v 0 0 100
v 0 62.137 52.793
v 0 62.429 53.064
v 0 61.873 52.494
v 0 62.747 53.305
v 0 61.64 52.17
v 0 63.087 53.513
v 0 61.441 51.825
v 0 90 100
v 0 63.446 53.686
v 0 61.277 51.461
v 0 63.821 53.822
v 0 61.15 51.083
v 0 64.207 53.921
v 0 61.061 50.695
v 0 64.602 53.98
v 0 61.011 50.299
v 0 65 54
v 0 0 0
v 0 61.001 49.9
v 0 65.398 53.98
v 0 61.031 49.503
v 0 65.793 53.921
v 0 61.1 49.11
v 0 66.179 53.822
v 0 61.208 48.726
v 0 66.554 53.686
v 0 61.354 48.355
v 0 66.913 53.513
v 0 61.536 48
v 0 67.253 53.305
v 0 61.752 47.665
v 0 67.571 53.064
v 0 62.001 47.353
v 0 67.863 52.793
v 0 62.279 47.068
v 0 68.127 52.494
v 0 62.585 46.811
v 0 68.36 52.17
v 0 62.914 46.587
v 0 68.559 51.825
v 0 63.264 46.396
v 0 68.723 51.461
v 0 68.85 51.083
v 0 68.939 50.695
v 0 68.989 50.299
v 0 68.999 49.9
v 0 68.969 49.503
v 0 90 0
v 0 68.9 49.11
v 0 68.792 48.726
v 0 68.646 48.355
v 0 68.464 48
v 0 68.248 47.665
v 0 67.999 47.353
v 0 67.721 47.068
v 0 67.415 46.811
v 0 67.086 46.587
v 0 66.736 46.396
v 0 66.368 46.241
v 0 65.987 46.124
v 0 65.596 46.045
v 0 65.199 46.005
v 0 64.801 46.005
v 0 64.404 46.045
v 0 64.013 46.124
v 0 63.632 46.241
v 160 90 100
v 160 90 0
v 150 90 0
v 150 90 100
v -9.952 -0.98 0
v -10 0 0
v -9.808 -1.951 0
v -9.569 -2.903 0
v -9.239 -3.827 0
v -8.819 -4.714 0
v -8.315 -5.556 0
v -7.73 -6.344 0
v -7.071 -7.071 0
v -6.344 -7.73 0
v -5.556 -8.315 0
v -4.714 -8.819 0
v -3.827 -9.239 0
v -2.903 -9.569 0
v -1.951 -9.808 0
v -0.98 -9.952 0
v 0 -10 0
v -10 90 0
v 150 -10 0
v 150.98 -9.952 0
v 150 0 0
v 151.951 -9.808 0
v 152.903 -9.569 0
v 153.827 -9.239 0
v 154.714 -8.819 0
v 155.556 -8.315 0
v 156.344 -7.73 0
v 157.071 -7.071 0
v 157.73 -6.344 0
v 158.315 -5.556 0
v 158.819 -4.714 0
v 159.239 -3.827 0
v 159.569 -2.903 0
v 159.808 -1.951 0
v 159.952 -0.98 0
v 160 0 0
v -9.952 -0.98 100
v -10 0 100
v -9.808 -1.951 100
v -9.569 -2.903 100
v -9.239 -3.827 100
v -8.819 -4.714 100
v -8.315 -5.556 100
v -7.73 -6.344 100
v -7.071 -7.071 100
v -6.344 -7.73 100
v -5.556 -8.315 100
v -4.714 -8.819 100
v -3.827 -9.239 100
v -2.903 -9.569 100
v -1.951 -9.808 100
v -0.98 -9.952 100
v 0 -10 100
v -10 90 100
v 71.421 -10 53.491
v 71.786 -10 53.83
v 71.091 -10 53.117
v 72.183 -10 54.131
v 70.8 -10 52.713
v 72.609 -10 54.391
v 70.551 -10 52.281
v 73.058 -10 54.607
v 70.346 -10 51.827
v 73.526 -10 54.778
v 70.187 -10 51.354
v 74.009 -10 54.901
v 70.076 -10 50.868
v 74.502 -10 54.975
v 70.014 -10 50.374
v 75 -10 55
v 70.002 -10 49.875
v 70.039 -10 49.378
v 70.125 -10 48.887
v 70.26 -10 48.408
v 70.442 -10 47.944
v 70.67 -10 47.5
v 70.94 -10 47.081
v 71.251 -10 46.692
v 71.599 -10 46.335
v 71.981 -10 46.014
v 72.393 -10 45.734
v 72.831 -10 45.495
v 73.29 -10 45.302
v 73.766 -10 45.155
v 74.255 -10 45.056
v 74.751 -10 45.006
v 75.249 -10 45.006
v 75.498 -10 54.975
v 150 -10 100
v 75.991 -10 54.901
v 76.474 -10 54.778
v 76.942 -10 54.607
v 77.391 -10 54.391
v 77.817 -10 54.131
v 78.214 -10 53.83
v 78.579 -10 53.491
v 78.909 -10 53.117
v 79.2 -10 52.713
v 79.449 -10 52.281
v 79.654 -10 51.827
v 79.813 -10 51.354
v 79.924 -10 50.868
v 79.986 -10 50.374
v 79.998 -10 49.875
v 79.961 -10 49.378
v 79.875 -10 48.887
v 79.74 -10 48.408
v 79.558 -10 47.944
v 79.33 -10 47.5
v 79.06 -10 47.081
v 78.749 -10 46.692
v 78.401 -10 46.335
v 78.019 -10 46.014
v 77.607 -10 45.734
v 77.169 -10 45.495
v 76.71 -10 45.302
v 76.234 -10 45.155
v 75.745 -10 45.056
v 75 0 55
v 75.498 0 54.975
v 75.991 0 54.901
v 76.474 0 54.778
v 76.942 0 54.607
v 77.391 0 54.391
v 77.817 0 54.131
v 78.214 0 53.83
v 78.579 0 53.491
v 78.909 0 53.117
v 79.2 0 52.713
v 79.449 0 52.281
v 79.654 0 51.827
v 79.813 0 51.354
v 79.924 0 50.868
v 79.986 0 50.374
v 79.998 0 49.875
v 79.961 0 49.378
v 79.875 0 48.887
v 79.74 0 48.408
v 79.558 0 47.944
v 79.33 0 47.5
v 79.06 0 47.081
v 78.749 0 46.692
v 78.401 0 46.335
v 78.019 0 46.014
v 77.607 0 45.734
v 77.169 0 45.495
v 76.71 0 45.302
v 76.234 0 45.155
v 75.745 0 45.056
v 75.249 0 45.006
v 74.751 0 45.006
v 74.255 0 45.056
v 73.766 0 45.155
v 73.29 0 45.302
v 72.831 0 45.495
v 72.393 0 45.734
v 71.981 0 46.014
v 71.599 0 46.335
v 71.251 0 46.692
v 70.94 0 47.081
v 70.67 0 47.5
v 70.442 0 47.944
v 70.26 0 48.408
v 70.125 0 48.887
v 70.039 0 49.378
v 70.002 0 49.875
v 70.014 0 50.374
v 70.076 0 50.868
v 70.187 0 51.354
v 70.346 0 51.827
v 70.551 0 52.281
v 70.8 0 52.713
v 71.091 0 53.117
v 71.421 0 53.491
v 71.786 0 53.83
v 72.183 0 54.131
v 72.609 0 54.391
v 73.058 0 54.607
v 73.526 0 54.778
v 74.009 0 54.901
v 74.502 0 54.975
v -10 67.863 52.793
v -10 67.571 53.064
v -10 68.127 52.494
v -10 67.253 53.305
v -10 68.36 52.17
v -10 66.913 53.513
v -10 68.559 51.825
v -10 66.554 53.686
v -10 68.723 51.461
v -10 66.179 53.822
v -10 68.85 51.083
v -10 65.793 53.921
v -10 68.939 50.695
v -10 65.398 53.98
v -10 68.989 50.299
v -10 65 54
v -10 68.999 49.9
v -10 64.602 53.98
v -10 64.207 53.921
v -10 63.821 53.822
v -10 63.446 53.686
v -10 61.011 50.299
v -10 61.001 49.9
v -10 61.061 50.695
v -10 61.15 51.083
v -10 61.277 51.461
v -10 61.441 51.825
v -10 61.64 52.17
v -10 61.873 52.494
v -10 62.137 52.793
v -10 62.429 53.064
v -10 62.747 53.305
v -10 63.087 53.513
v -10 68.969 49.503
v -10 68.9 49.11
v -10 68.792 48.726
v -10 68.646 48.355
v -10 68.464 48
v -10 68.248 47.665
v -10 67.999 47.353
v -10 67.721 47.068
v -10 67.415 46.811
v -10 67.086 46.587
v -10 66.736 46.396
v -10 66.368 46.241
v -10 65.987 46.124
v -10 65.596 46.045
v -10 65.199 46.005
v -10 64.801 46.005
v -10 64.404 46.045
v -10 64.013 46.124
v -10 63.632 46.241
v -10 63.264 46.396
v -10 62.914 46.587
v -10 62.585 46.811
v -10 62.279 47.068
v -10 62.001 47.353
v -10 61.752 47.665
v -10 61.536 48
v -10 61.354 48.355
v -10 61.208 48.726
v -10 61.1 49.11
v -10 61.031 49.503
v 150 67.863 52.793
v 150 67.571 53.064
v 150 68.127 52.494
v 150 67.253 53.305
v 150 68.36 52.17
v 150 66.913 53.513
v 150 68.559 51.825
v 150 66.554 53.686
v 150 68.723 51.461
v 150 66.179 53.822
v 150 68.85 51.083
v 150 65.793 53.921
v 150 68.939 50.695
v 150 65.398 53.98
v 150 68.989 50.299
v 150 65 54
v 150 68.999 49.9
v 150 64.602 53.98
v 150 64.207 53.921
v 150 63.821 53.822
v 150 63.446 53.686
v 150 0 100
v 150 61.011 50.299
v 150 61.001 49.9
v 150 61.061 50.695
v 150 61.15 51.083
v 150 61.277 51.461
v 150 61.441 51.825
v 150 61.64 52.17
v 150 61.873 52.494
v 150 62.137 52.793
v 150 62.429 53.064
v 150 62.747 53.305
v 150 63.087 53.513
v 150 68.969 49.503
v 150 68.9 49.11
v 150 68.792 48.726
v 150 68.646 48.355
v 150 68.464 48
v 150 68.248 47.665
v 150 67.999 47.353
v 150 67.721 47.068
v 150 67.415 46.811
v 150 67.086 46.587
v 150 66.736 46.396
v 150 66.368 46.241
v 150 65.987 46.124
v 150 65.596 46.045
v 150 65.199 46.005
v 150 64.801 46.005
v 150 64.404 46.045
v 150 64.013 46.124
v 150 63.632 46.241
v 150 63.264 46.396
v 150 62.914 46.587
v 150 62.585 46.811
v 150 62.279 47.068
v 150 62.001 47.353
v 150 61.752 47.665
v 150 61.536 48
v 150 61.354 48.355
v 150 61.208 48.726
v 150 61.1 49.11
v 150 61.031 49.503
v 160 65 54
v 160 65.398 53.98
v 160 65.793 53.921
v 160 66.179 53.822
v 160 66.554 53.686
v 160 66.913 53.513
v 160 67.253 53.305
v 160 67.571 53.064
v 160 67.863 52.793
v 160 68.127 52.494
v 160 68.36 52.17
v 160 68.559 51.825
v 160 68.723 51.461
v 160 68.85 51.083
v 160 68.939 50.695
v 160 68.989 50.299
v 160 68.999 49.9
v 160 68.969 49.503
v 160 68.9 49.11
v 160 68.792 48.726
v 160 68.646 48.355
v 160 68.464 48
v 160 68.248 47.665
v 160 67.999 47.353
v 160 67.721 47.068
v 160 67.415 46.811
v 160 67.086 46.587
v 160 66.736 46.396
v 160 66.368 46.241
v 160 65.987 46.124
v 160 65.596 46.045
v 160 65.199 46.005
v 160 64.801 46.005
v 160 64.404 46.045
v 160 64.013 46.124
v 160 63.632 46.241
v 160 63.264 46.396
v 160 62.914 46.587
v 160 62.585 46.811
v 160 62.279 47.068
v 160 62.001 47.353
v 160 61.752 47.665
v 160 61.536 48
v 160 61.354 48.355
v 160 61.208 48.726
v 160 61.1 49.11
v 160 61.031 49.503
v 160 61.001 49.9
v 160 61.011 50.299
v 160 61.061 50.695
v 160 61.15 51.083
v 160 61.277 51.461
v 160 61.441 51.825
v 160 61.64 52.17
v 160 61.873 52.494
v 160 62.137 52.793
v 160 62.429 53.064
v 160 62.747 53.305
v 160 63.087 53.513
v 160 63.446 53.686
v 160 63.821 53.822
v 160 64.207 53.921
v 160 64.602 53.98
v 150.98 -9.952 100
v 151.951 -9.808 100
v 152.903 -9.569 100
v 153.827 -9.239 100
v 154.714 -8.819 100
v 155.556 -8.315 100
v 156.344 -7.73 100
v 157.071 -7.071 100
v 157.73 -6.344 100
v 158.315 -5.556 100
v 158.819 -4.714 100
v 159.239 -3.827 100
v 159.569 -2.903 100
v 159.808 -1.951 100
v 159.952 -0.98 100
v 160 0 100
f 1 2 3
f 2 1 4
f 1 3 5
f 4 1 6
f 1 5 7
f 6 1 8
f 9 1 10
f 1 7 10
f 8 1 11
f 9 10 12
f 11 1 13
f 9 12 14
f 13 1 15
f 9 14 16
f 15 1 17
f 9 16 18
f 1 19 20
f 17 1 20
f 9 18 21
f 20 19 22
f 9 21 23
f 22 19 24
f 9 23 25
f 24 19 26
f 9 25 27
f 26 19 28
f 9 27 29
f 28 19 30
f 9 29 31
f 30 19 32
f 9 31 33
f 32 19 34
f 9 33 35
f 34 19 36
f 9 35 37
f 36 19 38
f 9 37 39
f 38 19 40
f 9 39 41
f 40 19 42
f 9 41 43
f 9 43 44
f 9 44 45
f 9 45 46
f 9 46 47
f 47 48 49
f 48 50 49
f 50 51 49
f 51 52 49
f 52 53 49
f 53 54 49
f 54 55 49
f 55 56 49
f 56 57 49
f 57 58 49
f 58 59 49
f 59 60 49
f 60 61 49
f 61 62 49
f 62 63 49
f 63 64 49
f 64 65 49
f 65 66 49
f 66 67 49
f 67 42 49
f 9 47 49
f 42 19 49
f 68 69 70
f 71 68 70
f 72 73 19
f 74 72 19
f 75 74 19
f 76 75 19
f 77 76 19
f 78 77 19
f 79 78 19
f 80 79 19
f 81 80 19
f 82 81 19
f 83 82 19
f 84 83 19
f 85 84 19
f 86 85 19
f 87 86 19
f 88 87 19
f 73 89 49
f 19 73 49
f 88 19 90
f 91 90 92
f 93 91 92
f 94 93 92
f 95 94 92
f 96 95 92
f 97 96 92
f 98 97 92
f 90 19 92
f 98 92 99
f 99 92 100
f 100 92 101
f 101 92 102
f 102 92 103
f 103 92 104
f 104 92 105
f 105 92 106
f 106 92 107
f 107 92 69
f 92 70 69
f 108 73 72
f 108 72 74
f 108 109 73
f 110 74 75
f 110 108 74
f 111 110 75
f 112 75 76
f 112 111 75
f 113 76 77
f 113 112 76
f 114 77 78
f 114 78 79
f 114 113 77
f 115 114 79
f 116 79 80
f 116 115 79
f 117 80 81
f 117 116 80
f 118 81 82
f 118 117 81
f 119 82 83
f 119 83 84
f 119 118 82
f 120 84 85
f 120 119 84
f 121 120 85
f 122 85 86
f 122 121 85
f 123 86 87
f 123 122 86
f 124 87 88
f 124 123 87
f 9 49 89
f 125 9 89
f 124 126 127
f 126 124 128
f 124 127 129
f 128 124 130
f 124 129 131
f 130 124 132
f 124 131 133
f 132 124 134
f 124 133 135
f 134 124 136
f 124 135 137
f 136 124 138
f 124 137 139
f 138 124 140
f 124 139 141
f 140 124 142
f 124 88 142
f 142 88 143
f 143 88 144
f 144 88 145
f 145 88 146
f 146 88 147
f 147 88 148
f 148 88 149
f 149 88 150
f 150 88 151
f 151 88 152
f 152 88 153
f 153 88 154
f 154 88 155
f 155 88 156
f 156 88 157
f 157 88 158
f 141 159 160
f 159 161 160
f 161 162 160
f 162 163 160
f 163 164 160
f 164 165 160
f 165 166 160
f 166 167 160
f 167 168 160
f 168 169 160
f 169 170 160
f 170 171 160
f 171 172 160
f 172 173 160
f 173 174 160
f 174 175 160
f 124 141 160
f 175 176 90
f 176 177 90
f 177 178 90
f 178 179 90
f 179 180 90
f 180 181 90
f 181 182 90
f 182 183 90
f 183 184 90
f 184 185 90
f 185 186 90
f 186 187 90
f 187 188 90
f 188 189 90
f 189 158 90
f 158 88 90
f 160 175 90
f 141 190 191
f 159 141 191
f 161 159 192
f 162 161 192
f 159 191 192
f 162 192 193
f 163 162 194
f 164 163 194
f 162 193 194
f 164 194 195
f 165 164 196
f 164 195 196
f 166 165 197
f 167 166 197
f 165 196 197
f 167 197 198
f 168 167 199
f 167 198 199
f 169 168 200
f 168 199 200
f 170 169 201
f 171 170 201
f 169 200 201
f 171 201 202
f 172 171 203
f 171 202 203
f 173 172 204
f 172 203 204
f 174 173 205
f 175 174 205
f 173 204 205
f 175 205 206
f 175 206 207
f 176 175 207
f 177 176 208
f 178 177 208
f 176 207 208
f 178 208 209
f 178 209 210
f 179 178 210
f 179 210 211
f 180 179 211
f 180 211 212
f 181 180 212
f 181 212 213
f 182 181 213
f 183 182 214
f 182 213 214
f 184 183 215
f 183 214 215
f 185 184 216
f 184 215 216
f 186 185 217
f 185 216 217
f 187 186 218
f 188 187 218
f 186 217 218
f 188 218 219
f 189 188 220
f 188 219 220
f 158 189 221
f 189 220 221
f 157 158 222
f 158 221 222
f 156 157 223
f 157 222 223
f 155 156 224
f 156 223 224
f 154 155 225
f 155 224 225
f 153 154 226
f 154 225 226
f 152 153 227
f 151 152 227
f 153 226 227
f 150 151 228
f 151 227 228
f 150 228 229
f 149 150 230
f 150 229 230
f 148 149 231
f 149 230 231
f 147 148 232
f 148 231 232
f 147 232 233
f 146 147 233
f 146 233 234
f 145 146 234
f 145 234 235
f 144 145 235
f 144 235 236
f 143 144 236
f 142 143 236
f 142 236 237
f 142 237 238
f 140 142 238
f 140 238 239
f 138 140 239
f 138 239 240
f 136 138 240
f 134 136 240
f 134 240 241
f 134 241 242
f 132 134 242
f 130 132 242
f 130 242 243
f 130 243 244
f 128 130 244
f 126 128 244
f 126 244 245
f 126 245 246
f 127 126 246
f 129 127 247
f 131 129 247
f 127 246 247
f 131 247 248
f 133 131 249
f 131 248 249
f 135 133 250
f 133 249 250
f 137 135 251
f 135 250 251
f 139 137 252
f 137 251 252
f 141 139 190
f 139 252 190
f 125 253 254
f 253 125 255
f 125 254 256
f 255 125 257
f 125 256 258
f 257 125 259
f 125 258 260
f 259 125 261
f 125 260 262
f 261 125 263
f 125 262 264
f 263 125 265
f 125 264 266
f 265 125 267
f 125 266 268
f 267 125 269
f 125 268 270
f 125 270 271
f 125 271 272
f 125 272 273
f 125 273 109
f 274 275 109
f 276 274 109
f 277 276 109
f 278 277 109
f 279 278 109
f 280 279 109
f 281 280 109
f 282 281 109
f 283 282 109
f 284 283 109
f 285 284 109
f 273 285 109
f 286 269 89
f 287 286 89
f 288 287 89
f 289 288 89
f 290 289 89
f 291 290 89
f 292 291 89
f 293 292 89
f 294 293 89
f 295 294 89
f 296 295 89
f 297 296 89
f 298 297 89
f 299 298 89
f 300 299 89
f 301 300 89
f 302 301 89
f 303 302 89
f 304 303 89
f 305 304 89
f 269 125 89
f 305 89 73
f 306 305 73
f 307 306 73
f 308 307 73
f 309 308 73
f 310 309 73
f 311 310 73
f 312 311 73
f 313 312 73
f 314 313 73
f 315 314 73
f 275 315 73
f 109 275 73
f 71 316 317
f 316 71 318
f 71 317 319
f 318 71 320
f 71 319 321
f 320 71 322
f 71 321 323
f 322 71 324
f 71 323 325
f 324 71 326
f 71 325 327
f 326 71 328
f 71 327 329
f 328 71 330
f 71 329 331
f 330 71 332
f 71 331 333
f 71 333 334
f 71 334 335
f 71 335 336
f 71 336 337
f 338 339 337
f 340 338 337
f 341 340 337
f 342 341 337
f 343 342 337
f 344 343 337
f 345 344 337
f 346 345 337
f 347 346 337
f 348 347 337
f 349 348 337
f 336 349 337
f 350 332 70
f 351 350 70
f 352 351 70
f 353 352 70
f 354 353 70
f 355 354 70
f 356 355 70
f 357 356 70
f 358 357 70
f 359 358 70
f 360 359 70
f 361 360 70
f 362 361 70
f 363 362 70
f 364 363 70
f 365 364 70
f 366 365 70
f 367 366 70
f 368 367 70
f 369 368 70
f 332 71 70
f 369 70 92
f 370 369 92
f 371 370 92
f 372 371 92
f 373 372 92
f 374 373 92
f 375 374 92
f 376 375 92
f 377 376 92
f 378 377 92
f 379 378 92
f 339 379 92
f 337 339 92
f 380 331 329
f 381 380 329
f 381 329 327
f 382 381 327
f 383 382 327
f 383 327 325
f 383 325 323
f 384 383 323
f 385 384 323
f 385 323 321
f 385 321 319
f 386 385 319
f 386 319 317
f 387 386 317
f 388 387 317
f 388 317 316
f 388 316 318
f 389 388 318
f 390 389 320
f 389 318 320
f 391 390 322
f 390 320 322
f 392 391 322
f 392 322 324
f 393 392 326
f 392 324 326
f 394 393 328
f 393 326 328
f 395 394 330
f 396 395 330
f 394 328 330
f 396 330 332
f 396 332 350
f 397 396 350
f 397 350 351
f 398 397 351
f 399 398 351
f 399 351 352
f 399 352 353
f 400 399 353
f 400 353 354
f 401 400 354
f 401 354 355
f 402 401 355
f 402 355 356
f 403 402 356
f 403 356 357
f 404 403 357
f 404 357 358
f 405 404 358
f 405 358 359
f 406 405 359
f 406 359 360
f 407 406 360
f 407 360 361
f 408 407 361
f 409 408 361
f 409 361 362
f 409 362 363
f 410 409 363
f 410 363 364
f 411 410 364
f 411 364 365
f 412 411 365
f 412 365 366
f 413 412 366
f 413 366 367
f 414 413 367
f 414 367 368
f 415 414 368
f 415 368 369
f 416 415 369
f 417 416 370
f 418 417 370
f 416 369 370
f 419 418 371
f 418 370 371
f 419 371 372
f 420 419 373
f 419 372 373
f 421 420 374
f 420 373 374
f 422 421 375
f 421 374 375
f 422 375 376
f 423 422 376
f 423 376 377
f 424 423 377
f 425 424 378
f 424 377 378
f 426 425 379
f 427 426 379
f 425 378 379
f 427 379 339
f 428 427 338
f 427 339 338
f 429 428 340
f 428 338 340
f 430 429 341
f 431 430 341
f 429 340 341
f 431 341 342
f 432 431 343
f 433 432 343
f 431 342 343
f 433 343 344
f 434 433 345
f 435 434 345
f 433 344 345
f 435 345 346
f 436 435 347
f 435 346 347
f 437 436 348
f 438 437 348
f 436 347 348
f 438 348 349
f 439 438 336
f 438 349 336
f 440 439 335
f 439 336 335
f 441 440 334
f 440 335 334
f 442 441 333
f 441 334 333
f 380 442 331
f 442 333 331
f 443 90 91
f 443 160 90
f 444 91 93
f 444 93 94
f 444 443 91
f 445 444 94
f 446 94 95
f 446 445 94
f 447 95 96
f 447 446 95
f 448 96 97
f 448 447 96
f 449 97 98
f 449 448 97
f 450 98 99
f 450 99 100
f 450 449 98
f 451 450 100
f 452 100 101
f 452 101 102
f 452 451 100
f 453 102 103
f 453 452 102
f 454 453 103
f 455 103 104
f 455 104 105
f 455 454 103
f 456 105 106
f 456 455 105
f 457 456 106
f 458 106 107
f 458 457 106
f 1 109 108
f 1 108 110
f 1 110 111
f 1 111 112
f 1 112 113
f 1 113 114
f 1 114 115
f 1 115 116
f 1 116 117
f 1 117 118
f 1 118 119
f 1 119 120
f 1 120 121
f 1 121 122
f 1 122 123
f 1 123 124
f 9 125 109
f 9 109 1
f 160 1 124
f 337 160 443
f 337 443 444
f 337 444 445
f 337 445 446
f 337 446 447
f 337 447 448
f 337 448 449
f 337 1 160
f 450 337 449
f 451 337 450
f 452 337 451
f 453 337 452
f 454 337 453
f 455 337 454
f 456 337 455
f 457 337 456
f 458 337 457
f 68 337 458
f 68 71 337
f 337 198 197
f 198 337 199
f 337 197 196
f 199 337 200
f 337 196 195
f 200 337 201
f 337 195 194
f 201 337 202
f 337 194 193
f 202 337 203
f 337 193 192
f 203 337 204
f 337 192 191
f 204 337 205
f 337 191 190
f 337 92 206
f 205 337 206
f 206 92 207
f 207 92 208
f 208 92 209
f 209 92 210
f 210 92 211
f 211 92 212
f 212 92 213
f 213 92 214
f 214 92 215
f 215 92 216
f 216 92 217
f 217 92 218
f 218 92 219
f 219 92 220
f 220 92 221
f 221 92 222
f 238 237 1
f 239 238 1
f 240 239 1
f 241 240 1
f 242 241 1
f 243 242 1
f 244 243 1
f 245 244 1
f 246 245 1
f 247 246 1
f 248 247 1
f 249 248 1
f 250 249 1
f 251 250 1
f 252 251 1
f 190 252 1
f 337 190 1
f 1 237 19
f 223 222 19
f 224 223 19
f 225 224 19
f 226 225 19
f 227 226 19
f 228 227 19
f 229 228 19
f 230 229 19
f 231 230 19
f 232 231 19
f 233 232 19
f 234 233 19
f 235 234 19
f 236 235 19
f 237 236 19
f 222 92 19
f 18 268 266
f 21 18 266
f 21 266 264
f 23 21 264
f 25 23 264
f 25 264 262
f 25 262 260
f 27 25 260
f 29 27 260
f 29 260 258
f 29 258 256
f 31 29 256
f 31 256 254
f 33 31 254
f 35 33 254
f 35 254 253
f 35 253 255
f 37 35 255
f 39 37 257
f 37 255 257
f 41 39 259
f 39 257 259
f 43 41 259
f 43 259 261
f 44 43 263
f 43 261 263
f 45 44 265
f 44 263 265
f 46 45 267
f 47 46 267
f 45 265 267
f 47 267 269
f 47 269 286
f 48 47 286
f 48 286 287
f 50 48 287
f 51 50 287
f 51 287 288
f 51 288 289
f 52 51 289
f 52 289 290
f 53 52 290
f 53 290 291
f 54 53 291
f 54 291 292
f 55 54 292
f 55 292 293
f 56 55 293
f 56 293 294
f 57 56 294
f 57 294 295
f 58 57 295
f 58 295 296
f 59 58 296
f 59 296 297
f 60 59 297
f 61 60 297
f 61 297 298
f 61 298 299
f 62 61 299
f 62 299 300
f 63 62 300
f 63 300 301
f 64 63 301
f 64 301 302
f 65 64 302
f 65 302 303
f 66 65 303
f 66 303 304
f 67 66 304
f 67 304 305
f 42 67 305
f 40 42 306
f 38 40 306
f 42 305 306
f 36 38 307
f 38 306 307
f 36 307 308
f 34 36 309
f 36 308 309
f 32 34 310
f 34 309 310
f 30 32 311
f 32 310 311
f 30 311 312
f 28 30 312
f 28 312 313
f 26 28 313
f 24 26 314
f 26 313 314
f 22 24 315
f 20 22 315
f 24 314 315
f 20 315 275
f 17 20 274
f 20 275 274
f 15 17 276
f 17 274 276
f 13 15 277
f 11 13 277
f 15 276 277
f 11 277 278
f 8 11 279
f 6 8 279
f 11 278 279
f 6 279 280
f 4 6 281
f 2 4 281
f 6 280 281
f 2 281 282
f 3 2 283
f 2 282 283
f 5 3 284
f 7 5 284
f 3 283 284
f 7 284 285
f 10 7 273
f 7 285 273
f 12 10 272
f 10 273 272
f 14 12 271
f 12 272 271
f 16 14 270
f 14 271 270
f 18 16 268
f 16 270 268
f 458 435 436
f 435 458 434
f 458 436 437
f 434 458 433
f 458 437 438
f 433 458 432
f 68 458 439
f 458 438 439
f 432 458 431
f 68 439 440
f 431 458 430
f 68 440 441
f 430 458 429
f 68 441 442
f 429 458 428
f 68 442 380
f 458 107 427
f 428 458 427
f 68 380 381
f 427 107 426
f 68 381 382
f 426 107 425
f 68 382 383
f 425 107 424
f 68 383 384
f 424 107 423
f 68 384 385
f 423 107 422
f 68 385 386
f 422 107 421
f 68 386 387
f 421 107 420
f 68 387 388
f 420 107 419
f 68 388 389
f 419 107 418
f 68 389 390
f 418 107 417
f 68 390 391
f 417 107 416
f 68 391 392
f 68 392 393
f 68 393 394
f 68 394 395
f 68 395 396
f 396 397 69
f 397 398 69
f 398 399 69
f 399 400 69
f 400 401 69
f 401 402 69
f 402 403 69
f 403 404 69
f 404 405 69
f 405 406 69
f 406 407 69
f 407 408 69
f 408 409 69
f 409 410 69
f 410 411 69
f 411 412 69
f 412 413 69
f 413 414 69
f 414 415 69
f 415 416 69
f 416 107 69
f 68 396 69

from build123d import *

# Parameters (mm, degrees)
SKETCH1_W           = 75
SKETCH1_H           = 10
BOSS_EXTRUDE1_DEPTH = 100
SKETCH2_R           = 5
CUT_EXTRUDE1_DEPTH  = 10
FILLET1_R           = 10
SKETCH3_R           = 4
CUT_EXTRUDE2_DEPTH  = 192


with BuildPart() as part:
    # Sketch1 → Boss-Extrude1 (new body)
    with BuildSketch(Plane.XY):
        with Locations((112.5, -5)):
            Rectangle(SKETCH1_W, SKETCH1_H)
        with Locations((37.5, -5)):
            Rectangle(SKETCH1_W, SKETCH1_H)
        Polygon((150, 0), (150, -10), (160, -10), (160, 90), (150, 90), align=None)
        Polygon((-10, -10), (0, -10), (0, 0), (0, 90), (-10, 90), align=None)
    extrude(amount=BOSS_EXTRUDE1_DEPTH)

    # Sketch2 → Cut-Extrude1 (cut)
    with BuildSketch(Plane(origin=(0, 0, 0), x_dir=(1, 0, 0), z_dir=(0, 1, 0))):
        with Locations(Location((75, -50, 0), (0, 0, 270))):
            Circle(SKETCH2_R)
    extrude(amount=-CUT_EXTRUDE1_DEPTH, mode=Mode.SUBTRACT)

    # Fillet1
    fillet1_edges = [part.edges().sort_by_distance(p)[0] for p in [
        (160, -10, 50),
        (-10, -10, 50),
    ]]
    fillet(fillet1_edges, radius=FILLET1_R)

    # Sketch3 → Cut-Extrude2 (cut)
    with BuildSketch(Plane.ZY.offset(10)):
        with Locations((50, 65)):
            Circle(SKETCH3_R)
    extrude(amount=-CUT_EXTRUDE2_DEPTH, mode=Mode.SUBTRACT)


solid = part.part
